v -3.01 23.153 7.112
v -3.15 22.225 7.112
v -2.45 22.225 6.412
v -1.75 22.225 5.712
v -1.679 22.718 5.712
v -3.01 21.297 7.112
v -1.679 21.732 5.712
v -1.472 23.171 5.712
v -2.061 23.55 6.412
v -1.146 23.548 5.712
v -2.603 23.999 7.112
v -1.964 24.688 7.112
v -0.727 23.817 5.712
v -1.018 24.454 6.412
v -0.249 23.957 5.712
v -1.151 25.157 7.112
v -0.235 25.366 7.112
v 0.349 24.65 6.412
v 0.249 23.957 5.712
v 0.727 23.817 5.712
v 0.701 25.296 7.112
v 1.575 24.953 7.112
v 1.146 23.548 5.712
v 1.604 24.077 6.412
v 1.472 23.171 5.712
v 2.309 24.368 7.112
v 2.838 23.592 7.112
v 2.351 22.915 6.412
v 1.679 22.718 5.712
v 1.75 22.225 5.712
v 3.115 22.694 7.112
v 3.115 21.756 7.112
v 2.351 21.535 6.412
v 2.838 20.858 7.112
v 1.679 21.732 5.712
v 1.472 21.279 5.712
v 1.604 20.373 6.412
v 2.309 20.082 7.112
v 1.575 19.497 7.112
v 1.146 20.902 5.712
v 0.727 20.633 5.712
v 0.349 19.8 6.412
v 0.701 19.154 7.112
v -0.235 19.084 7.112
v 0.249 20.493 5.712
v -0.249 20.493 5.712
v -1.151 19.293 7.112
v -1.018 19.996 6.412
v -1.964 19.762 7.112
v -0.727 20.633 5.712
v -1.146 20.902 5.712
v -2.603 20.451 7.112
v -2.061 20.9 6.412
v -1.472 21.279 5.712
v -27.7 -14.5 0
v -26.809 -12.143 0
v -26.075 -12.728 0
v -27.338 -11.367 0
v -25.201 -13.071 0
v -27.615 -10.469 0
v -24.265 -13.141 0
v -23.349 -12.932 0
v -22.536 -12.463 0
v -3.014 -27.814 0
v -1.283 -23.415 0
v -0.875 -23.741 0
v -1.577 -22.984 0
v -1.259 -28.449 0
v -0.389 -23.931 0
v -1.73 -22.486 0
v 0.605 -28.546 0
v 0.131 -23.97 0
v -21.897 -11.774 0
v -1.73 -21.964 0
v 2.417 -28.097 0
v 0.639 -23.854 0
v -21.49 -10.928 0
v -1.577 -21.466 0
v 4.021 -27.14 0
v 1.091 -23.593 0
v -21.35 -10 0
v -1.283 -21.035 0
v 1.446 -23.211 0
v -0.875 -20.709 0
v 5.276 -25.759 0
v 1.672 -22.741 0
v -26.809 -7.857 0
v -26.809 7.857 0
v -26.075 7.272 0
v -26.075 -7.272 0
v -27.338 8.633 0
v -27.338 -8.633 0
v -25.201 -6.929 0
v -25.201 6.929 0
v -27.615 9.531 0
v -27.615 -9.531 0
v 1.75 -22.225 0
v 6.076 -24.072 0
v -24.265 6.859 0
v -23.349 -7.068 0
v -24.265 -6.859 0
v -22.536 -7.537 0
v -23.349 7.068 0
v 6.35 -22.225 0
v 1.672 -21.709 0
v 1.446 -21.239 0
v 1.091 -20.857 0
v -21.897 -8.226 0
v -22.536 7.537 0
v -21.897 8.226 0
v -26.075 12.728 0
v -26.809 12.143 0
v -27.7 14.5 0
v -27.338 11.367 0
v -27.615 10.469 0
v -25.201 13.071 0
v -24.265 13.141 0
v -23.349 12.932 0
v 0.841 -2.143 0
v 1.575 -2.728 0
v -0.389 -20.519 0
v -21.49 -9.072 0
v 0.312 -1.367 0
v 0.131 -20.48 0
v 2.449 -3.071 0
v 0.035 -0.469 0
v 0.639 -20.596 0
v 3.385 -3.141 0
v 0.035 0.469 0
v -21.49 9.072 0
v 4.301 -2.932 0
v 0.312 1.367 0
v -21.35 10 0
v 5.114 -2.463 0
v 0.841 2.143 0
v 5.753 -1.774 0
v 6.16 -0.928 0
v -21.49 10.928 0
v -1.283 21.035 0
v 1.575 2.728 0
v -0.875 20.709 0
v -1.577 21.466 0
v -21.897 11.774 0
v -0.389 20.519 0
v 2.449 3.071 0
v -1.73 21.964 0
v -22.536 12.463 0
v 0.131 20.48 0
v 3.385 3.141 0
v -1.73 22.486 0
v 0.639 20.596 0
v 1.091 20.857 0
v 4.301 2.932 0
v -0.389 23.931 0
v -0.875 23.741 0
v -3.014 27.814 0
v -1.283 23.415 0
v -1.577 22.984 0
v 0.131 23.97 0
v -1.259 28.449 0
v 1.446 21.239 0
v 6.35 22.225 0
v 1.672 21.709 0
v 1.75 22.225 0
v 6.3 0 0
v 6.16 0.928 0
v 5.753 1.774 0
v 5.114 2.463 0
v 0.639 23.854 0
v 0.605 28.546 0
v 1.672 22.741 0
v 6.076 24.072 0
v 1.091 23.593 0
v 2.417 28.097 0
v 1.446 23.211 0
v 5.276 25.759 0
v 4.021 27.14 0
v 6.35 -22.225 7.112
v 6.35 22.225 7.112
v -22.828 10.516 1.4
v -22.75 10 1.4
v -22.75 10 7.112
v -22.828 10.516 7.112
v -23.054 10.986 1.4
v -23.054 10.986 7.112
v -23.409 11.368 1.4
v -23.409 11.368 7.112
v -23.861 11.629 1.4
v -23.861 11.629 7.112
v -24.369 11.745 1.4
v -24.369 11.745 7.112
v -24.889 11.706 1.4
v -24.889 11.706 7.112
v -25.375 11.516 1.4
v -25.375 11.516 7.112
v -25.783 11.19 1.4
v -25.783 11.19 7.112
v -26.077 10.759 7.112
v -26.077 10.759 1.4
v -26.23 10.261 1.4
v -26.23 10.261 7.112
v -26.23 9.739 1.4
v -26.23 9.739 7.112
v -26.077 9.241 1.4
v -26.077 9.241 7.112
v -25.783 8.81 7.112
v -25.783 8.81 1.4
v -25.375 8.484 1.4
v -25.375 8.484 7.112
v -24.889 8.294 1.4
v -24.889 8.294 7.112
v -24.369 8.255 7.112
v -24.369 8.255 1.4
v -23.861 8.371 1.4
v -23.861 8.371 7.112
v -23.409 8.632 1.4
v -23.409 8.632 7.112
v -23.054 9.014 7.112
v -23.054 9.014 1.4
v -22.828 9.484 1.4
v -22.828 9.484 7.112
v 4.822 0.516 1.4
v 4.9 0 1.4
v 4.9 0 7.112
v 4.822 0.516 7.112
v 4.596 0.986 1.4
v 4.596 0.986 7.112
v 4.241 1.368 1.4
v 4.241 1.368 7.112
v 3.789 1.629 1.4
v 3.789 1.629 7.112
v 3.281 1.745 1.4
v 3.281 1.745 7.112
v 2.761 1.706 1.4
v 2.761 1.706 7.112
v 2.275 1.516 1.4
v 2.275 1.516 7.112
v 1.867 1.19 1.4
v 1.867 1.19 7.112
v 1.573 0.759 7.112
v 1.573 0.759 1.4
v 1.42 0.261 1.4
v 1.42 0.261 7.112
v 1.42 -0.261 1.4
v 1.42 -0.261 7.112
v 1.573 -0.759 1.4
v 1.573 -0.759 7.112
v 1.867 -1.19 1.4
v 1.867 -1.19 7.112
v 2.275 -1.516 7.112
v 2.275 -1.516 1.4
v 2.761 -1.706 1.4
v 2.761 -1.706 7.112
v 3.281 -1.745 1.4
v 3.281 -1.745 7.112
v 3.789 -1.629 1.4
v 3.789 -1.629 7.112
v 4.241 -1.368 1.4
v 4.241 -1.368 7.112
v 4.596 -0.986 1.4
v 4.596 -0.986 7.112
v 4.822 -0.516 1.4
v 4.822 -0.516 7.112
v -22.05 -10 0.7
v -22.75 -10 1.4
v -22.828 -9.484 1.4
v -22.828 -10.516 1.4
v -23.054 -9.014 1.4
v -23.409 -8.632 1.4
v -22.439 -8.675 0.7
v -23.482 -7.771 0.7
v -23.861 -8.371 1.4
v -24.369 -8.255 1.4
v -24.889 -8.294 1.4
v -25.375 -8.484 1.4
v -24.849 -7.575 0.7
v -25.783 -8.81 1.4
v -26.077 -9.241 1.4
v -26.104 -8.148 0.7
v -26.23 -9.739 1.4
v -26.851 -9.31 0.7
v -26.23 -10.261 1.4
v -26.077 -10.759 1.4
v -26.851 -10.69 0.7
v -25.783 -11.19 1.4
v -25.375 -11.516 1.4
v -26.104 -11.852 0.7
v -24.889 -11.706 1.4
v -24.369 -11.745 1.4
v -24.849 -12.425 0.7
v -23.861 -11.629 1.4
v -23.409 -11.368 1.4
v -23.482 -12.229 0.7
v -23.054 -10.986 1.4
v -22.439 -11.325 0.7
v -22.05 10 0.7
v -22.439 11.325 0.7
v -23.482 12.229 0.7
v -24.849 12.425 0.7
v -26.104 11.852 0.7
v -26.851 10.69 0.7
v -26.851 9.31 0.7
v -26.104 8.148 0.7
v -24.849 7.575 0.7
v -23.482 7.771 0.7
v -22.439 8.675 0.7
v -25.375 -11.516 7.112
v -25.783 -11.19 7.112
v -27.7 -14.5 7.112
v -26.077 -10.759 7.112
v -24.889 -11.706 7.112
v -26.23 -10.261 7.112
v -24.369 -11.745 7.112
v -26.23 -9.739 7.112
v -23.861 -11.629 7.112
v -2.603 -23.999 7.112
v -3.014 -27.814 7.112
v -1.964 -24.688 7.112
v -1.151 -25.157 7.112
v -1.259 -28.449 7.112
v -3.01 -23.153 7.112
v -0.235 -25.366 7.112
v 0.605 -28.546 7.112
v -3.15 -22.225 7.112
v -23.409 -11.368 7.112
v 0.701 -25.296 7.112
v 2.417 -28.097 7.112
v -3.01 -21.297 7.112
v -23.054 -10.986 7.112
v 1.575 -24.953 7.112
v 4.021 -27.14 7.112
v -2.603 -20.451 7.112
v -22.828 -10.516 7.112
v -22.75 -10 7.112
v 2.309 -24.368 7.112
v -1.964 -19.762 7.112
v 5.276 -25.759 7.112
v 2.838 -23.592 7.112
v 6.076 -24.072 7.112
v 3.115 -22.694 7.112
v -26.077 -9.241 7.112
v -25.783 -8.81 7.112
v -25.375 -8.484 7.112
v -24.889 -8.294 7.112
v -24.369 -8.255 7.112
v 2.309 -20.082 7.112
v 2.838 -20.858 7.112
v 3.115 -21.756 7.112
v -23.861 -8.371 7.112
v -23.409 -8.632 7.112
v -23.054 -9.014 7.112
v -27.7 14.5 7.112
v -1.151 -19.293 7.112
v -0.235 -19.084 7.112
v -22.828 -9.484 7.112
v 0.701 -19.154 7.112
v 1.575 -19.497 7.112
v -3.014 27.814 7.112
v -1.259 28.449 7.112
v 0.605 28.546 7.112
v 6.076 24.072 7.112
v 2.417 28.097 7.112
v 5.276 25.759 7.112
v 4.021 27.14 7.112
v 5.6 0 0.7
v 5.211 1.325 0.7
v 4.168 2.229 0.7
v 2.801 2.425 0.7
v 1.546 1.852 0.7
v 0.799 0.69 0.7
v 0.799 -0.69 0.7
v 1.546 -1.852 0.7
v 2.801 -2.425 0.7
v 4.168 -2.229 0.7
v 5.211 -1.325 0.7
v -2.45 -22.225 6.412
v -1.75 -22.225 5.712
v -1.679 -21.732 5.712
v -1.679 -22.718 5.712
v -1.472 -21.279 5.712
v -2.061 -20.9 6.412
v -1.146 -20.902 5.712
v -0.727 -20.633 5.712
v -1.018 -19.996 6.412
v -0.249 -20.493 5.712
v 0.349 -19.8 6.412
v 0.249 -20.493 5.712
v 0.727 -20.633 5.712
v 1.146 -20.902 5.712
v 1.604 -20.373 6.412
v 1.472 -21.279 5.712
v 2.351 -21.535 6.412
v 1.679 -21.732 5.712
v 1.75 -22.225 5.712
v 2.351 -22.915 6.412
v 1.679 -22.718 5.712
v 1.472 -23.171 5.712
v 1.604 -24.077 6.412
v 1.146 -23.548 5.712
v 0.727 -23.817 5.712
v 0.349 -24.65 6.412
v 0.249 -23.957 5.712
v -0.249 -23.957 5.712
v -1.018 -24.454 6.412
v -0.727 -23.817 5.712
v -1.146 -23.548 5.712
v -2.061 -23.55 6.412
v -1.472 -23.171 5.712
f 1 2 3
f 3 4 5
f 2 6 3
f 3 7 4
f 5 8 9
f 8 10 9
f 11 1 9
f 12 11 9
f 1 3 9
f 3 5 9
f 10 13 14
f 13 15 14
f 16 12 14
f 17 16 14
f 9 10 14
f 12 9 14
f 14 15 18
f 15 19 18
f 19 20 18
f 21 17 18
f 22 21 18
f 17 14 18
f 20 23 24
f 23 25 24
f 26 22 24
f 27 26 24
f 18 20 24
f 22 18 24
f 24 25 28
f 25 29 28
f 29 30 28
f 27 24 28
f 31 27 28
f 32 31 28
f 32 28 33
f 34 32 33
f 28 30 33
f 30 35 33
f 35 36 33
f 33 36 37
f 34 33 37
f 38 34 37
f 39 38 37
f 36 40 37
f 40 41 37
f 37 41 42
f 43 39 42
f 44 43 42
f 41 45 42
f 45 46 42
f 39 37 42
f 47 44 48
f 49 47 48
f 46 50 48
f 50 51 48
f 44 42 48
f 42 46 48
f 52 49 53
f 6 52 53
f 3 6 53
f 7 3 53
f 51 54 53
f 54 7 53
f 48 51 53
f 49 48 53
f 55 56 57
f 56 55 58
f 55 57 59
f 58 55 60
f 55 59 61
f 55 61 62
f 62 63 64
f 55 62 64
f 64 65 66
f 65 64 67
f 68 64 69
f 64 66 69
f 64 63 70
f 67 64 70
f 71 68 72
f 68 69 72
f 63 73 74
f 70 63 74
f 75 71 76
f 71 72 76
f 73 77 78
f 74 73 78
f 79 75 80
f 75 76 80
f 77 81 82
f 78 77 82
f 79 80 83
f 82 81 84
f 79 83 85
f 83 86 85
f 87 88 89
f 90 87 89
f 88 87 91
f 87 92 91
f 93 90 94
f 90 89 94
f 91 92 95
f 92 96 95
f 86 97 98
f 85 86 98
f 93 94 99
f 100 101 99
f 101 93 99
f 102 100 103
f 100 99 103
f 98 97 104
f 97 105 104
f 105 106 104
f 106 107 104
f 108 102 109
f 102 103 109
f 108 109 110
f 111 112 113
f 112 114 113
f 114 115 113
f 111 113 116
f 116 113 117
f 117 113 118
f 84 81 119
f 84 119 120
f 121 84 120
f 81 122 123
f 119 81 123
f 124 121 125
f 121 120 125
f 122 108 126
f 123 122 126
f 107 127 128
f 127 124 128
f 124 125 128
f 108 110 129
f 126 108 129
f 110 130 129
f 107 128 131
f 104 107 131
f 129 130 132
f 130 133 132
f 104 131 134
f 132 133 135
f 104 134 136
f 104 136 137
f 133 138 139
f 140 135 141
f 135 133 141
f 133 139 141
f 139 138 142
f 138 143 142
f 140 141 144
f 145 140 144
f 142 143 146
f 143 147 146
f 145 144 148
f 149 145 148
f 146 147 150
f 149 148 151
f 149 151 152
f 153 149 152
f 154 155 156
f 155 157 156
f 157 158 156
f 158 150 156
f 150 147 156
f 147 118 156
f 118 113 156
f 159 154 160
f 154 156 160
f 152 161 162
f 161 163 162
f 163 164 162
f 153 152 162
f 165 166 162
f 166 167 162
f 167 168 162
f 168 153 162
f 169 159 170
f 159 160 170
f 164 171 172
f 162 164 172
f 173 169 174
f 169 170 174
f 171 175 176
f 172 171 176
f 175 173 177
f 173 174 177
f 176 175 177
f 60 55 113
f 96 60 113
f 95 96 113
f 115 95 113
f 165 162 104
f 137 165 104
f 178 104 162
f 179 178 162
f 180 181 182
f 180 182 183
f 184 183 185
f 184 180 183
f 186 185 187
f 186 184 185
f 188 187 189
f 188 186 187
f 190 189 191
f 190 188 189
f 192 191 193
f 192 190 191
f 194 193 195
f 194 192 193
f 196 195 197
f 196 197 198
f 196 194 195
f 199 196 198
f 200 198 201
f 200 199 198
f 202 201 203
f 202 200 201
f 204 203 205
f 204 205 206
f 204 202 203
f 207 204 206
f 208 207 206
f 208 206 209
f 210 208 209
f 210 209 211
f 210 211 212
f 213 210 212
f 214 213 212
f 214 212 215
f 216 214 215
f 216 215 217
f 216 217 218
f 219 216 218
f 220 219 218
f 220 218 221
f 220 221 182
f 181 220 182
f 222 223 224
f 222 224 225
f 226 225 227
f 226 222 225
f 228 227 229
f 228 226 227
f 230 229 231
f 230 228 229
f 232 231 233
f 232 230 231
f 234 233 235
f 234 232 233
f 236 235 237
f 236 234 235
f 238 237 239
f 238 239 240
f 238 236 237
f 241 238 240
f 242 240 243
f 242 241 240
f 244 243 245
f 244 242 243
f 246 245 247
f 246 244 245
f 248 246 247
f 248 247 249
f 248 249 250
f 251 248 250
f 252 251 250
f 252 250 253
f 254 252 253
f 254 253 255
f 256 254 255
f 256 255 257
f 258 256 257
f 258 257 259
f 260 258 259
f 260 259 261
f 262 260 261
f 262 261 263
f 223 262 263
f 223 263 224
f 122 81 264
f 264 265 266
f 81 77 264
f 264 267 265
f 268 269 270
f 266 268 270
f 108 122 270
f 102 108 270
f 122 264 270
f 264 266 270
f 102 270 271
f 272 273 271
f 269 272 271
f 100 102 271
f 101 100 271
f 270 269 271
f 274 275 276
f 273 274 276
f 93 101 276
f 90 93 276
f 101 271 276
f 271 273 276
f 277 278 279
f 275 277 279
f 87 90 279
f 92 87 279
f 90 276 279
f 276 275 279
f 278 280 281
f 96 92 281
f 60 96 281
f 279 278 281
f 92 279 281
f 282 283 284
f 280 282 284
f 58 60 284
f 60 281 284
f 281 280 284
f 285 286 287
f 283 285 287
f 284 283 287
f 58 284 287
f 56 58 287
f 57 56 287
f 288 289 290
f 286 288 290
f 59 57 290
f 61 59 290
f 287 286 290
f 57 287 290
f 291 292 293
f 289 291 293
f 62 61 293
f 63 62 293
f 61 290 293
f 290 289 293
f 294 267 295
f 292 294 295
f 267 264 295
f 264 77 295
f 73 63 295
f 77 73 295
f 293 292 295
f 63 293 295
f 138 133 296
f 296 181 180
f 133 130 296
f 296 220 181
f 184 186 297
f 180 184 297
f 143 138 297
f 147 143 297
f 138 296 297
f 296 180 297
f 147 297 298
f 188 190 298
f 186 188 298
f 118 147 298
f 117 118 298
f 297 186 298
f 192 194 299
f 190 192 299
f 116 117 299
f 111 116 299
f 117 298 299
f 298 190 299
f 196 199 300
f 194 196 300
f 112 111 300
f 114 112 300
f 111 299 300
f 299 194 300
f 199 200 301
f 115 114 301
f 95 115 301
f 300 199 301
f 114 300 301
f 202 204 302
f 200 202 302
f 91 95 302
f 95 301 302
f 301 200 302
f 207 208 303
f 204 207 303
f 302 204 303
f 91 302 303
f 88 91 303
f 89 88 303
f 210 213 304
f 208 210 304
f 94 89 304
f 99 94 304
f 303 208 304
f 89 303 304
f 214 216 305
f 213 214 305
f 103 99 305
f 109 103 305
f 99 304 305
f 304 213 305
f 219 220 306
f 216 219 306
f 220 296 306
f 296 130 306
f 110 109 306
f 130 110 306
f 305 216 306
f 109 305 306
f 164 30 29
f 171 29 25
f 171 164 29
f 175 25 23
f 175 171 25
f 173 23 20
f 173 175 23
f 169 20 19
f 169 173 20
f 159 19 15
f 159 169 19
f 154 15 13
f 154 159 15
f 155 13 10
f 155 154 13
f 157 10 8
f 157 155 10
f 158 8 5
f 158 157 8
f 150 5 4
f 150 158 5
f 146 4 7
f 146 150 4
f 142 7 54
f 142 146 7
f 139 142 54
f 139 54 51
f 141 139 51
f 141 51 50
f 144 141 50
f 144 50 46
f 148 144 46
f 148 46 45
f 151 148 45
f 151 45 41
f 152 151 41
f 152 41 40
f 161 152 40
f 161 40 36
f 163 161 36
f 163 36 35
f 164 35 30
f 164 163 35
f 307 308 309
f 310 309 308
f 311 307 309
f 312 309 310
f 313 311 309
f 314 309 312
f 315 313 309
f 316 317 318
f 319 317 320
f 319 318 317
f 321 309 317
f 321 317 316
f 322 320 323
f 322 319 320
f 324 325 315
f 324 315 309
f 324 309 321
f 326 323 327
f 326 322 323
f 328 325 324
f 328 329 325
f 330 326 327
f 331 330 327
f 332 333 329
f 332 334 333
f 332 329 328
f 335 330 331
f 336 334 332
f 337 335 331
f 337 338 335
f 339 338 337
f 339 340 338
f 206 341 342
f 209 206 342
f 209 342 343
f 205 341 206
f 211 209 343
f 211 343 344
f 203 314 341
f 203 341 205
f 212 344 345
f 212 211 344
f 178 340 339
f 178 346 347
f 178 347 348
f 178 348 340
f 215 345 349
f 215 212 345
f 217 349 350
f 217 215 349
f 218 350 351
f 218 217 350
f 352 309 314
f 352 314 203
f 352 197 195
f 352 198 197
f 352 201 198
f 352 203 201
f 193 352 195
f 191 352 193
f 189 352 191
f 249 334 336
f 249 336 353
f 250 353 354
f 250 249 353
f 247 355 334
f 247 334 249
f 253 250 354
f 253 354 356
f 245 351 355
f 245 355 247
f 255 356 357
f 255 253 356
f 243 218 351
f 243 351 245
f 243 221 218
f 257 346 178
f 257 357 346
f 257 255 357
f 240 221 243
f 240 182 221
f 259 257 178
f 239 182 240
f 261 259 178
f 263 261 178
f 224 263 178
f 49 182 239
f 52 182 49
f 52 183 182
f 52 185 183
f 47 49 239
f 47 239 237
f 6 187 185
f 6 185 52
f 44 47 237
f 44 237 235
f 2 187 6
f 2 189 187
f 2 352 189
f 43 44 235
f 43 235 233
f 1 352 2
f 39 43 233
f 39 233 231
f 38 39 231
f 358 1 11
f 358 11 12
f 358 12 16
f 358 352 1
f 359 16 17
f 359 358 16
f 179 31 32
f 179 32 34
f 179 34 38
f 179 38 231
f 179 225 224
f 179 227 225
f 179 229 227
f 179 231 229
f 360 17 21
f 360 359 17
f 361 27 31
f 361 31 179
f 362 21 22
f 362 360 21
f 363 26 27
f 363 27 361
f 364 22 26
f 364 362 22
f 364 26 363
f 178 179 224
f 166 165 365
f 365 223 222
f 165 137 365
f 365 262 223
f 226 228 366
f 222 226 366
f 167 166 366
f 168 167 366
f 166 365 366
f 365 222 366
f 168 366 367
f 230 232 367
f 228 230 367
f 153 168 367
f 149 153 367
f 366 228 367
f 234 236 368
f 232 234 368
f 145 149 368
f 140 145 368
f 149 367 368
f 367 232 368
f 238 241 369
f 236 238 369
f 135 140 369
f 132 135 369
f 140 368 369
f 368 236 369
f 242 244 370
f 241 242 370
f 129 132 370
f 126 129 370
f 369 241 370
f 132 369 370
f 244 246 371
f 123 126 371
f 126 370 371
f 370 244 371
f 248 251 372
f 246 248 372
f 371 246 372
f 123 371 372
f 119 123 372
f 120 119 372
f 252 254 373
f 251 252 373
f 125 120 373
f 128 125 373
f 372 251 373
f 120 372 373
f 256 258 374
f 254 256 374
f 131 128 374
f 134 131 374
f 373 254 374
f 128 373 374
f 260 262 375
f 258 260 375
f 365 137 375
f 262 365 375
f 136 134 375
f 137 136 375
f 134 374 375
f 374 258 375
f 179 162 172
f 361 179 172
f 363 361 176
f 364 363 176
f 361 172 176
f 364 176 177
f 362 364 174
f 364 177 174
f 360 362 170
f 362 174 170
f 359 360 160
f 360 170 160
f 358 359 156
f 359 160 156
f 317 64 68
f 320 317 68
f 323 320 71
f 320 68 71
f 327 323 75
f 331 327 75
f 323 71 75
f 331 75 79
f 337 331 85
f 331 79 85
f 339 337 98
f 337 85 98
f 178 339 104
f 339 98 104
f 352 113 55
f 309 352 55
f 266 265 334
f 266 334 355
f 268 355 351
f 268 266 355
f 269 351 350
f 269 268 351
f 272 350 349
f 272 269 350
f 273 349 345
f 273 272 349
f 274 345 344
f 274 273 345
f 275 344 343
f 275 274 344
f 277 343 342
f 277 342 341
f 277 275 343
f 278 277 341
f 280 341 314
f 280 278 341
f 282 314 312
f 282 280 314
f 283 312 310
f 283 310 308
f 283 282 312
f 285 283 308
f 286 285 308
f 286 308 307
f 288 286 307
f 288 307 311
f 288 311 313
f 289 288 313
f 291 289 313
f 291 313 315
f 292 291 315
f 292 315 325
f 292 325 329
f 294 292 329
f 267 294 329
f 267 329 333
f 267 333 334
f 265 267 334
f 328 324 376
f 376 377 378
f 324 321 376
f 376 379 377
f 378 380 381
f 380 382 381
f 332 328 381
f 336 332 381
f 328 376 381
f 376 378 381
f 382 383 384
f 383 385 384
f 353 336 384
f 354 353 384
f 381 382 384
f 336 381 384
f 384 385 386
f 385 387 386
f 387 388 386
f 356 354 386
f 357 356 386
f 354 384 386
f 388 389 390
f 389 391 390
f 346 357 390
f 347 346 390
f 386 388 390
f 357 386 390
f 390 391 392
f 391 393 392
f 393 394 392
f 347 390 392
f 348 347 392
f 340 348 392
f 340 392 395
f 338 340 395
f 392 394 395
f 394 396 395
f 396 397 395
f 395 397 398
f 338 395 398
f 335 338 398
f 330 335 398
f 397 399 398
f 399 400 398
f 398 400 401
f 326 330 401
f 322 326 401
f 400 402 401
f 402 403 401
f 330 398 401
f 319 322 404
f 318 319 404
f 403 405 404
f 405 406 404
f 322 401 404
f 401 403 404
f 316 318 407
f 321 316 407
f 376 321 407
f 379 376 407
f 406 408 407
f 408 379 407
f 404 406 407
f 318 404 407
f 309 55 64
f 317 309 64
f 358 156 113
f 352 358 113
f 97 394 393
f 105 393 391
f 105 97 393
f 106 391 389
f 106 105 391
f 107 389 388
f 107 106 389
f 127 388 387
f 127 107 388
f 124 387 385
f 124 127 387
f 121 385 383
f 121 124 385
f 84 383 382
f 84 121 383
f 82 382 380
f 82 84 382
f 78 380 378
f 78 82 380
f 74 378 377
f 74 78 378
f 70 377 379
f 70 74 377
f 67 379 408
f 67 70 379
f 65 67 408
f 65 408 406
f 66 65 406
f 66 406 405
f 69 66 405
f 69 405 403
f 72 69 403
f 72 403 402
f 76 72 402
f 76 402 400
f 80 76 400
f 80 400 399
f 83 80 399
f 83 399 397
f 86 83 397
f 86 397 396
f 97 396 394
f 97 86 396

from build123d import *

# Parameters (mm, degrees)
SKETCH1_R                                       = 1.75
BOSS_EXTRUDE1_DEPTH                             = 7.112
CSK_FOR_M3_FLAT_HEAD_MACHINE_SCREW1_D           = 3.2
CSK_FOR_M3_FLAT_HEAD_MACHINE_SCREW1_CSINK_D     = 6.3
CSK_FOR_M3_FLAT_HEAD_MACHINE_SCREW1_CSINK_ANGLE = 90
CSK_FOR_M3_FLAT_HEAD_MACHINE_SCREW2_D           = 3.2
CSK_FOR_M3_FLAT_HEAD_MACHINE_SCREW2_CSINK_D     = 6.3
CSK_FOR_M3_FLAT_HEAD_MACHINE_SCREW2_CSINK_ANGLE = 90
CSK_FOR_M3_FLAT_HEAD_MACHINE_SCREW3_D           = 3.2
CSK_FOR_M3_FLAT_HEAD_MACHINE_SCREW3_CSINK_D     = 6.3
CSK_FOR_M3_FLAT_HEAD_MACHINE_SCREW3_CSINK_ANGLE = 90


with BuildPart() as part:
    # Sketch1 → Boss-Extrude1 (new body)
    with BuildSketch(Plane.XY):
        with BuildLine():
            Line((-27.7, 14.5), (-27.7, -14.5))
            Line((-27.7, -14.5), (-3.014335177, -27.813942963))
            ThreePointArc((-3.014335177, -27.813942963), (3.254341072, -27.677684127), (6.35, -22.225))
            Line((6.35, -22.225), (6.35, 22.225))
            ThreePointArc((6.35, 22.225), (3.254341072, 27.677684127), (-3.014335177, 27.813942963))
            Line((-3.014335177, 27.813942963), (-27.7, 14.5))
        make_face()
        with Locations((0, 22.225)):
            Circle(SKETCH1_R, mode=Mode.SUBTRACT)
        with Locations((0, -22.225)):
            Circle(SKETCH1_R, mode=Mode.SUBTRACT)
        with Locations((-24.5, 10)):
            Circle(SKETCH1_R, mode=Mode.SUBTRACT)
        with Locations((-24.5, -10)):
            Circle(SKETCH1_R, mode=Mode.SUBTRACT)
        with Locations((3.15, 0)):
            Circle(SKETCH1_R, mode=Mode.SUBTRACT)
    extrude(amount=BOSS_EXTRUDE1_DEPTH)

    # CSK for M3 Flat Head Machine Screw1 (through all)
    with Locations(Plane(origin=(-24.5, 10, 0), x_dir=(-1, 0, 0), z_dir=(0, 0, -1))):
        with Locations((0, 0), (0, -20)):
            CounterSinkHole(CSK_FOR_M3_FLAT_HEAD_MACHINE_SCREW1_D / 2, CSK_FOR_M3_FLAT_HEAD_MACHINE_SCREW1_CSINK_D / 2, counter_sink_angle=CSK_FOR_M3_FLAT_HEAD_MACHINE_SCREW1_CSINK_ANGLE)

    # CSK for M3 Flat Head Machine Screw2 (through all)
    with Locations(Plane(origin=(0, 0, 0), x_dir=(-1, 0, 0), z_dir=(0, 0, -1))):
        with Locations((-3.15, 0)):
            CounterSinkHole(CSK_FOR_M3_FLAT_HEAD_MACHINE_SCREW2_D / 2, CSK_FOR_M3_FLAT_HEAD_MACHINE_SCREW2_CSINK_D / 2, counter_sink_angle=CSK_FOR_M3_FLAT_HEAD_MACHINE_SCREW2_CSINK_ANGLE)

    # CSK for M3 Flat Head Machine Screw3 (through all)
    with Locations(Plane.XY.offset(7.112)):
        with Locations((0, 22.225), (0, -22.225)):
            CounterSinkHole(CSK_FOR_M3_FLAT_HEAD_MACHINE_SCREW3_D / 2, CSK_FOR_M3_FLAT_HEAD_MACHINE_SCREW3_CSINK_D / 2, counter_sink_angle=CSK_FOR_M3_FLAT_HEAD_MACHINE_SCREW3_CSINK_ANGLE)


solid = part.part
